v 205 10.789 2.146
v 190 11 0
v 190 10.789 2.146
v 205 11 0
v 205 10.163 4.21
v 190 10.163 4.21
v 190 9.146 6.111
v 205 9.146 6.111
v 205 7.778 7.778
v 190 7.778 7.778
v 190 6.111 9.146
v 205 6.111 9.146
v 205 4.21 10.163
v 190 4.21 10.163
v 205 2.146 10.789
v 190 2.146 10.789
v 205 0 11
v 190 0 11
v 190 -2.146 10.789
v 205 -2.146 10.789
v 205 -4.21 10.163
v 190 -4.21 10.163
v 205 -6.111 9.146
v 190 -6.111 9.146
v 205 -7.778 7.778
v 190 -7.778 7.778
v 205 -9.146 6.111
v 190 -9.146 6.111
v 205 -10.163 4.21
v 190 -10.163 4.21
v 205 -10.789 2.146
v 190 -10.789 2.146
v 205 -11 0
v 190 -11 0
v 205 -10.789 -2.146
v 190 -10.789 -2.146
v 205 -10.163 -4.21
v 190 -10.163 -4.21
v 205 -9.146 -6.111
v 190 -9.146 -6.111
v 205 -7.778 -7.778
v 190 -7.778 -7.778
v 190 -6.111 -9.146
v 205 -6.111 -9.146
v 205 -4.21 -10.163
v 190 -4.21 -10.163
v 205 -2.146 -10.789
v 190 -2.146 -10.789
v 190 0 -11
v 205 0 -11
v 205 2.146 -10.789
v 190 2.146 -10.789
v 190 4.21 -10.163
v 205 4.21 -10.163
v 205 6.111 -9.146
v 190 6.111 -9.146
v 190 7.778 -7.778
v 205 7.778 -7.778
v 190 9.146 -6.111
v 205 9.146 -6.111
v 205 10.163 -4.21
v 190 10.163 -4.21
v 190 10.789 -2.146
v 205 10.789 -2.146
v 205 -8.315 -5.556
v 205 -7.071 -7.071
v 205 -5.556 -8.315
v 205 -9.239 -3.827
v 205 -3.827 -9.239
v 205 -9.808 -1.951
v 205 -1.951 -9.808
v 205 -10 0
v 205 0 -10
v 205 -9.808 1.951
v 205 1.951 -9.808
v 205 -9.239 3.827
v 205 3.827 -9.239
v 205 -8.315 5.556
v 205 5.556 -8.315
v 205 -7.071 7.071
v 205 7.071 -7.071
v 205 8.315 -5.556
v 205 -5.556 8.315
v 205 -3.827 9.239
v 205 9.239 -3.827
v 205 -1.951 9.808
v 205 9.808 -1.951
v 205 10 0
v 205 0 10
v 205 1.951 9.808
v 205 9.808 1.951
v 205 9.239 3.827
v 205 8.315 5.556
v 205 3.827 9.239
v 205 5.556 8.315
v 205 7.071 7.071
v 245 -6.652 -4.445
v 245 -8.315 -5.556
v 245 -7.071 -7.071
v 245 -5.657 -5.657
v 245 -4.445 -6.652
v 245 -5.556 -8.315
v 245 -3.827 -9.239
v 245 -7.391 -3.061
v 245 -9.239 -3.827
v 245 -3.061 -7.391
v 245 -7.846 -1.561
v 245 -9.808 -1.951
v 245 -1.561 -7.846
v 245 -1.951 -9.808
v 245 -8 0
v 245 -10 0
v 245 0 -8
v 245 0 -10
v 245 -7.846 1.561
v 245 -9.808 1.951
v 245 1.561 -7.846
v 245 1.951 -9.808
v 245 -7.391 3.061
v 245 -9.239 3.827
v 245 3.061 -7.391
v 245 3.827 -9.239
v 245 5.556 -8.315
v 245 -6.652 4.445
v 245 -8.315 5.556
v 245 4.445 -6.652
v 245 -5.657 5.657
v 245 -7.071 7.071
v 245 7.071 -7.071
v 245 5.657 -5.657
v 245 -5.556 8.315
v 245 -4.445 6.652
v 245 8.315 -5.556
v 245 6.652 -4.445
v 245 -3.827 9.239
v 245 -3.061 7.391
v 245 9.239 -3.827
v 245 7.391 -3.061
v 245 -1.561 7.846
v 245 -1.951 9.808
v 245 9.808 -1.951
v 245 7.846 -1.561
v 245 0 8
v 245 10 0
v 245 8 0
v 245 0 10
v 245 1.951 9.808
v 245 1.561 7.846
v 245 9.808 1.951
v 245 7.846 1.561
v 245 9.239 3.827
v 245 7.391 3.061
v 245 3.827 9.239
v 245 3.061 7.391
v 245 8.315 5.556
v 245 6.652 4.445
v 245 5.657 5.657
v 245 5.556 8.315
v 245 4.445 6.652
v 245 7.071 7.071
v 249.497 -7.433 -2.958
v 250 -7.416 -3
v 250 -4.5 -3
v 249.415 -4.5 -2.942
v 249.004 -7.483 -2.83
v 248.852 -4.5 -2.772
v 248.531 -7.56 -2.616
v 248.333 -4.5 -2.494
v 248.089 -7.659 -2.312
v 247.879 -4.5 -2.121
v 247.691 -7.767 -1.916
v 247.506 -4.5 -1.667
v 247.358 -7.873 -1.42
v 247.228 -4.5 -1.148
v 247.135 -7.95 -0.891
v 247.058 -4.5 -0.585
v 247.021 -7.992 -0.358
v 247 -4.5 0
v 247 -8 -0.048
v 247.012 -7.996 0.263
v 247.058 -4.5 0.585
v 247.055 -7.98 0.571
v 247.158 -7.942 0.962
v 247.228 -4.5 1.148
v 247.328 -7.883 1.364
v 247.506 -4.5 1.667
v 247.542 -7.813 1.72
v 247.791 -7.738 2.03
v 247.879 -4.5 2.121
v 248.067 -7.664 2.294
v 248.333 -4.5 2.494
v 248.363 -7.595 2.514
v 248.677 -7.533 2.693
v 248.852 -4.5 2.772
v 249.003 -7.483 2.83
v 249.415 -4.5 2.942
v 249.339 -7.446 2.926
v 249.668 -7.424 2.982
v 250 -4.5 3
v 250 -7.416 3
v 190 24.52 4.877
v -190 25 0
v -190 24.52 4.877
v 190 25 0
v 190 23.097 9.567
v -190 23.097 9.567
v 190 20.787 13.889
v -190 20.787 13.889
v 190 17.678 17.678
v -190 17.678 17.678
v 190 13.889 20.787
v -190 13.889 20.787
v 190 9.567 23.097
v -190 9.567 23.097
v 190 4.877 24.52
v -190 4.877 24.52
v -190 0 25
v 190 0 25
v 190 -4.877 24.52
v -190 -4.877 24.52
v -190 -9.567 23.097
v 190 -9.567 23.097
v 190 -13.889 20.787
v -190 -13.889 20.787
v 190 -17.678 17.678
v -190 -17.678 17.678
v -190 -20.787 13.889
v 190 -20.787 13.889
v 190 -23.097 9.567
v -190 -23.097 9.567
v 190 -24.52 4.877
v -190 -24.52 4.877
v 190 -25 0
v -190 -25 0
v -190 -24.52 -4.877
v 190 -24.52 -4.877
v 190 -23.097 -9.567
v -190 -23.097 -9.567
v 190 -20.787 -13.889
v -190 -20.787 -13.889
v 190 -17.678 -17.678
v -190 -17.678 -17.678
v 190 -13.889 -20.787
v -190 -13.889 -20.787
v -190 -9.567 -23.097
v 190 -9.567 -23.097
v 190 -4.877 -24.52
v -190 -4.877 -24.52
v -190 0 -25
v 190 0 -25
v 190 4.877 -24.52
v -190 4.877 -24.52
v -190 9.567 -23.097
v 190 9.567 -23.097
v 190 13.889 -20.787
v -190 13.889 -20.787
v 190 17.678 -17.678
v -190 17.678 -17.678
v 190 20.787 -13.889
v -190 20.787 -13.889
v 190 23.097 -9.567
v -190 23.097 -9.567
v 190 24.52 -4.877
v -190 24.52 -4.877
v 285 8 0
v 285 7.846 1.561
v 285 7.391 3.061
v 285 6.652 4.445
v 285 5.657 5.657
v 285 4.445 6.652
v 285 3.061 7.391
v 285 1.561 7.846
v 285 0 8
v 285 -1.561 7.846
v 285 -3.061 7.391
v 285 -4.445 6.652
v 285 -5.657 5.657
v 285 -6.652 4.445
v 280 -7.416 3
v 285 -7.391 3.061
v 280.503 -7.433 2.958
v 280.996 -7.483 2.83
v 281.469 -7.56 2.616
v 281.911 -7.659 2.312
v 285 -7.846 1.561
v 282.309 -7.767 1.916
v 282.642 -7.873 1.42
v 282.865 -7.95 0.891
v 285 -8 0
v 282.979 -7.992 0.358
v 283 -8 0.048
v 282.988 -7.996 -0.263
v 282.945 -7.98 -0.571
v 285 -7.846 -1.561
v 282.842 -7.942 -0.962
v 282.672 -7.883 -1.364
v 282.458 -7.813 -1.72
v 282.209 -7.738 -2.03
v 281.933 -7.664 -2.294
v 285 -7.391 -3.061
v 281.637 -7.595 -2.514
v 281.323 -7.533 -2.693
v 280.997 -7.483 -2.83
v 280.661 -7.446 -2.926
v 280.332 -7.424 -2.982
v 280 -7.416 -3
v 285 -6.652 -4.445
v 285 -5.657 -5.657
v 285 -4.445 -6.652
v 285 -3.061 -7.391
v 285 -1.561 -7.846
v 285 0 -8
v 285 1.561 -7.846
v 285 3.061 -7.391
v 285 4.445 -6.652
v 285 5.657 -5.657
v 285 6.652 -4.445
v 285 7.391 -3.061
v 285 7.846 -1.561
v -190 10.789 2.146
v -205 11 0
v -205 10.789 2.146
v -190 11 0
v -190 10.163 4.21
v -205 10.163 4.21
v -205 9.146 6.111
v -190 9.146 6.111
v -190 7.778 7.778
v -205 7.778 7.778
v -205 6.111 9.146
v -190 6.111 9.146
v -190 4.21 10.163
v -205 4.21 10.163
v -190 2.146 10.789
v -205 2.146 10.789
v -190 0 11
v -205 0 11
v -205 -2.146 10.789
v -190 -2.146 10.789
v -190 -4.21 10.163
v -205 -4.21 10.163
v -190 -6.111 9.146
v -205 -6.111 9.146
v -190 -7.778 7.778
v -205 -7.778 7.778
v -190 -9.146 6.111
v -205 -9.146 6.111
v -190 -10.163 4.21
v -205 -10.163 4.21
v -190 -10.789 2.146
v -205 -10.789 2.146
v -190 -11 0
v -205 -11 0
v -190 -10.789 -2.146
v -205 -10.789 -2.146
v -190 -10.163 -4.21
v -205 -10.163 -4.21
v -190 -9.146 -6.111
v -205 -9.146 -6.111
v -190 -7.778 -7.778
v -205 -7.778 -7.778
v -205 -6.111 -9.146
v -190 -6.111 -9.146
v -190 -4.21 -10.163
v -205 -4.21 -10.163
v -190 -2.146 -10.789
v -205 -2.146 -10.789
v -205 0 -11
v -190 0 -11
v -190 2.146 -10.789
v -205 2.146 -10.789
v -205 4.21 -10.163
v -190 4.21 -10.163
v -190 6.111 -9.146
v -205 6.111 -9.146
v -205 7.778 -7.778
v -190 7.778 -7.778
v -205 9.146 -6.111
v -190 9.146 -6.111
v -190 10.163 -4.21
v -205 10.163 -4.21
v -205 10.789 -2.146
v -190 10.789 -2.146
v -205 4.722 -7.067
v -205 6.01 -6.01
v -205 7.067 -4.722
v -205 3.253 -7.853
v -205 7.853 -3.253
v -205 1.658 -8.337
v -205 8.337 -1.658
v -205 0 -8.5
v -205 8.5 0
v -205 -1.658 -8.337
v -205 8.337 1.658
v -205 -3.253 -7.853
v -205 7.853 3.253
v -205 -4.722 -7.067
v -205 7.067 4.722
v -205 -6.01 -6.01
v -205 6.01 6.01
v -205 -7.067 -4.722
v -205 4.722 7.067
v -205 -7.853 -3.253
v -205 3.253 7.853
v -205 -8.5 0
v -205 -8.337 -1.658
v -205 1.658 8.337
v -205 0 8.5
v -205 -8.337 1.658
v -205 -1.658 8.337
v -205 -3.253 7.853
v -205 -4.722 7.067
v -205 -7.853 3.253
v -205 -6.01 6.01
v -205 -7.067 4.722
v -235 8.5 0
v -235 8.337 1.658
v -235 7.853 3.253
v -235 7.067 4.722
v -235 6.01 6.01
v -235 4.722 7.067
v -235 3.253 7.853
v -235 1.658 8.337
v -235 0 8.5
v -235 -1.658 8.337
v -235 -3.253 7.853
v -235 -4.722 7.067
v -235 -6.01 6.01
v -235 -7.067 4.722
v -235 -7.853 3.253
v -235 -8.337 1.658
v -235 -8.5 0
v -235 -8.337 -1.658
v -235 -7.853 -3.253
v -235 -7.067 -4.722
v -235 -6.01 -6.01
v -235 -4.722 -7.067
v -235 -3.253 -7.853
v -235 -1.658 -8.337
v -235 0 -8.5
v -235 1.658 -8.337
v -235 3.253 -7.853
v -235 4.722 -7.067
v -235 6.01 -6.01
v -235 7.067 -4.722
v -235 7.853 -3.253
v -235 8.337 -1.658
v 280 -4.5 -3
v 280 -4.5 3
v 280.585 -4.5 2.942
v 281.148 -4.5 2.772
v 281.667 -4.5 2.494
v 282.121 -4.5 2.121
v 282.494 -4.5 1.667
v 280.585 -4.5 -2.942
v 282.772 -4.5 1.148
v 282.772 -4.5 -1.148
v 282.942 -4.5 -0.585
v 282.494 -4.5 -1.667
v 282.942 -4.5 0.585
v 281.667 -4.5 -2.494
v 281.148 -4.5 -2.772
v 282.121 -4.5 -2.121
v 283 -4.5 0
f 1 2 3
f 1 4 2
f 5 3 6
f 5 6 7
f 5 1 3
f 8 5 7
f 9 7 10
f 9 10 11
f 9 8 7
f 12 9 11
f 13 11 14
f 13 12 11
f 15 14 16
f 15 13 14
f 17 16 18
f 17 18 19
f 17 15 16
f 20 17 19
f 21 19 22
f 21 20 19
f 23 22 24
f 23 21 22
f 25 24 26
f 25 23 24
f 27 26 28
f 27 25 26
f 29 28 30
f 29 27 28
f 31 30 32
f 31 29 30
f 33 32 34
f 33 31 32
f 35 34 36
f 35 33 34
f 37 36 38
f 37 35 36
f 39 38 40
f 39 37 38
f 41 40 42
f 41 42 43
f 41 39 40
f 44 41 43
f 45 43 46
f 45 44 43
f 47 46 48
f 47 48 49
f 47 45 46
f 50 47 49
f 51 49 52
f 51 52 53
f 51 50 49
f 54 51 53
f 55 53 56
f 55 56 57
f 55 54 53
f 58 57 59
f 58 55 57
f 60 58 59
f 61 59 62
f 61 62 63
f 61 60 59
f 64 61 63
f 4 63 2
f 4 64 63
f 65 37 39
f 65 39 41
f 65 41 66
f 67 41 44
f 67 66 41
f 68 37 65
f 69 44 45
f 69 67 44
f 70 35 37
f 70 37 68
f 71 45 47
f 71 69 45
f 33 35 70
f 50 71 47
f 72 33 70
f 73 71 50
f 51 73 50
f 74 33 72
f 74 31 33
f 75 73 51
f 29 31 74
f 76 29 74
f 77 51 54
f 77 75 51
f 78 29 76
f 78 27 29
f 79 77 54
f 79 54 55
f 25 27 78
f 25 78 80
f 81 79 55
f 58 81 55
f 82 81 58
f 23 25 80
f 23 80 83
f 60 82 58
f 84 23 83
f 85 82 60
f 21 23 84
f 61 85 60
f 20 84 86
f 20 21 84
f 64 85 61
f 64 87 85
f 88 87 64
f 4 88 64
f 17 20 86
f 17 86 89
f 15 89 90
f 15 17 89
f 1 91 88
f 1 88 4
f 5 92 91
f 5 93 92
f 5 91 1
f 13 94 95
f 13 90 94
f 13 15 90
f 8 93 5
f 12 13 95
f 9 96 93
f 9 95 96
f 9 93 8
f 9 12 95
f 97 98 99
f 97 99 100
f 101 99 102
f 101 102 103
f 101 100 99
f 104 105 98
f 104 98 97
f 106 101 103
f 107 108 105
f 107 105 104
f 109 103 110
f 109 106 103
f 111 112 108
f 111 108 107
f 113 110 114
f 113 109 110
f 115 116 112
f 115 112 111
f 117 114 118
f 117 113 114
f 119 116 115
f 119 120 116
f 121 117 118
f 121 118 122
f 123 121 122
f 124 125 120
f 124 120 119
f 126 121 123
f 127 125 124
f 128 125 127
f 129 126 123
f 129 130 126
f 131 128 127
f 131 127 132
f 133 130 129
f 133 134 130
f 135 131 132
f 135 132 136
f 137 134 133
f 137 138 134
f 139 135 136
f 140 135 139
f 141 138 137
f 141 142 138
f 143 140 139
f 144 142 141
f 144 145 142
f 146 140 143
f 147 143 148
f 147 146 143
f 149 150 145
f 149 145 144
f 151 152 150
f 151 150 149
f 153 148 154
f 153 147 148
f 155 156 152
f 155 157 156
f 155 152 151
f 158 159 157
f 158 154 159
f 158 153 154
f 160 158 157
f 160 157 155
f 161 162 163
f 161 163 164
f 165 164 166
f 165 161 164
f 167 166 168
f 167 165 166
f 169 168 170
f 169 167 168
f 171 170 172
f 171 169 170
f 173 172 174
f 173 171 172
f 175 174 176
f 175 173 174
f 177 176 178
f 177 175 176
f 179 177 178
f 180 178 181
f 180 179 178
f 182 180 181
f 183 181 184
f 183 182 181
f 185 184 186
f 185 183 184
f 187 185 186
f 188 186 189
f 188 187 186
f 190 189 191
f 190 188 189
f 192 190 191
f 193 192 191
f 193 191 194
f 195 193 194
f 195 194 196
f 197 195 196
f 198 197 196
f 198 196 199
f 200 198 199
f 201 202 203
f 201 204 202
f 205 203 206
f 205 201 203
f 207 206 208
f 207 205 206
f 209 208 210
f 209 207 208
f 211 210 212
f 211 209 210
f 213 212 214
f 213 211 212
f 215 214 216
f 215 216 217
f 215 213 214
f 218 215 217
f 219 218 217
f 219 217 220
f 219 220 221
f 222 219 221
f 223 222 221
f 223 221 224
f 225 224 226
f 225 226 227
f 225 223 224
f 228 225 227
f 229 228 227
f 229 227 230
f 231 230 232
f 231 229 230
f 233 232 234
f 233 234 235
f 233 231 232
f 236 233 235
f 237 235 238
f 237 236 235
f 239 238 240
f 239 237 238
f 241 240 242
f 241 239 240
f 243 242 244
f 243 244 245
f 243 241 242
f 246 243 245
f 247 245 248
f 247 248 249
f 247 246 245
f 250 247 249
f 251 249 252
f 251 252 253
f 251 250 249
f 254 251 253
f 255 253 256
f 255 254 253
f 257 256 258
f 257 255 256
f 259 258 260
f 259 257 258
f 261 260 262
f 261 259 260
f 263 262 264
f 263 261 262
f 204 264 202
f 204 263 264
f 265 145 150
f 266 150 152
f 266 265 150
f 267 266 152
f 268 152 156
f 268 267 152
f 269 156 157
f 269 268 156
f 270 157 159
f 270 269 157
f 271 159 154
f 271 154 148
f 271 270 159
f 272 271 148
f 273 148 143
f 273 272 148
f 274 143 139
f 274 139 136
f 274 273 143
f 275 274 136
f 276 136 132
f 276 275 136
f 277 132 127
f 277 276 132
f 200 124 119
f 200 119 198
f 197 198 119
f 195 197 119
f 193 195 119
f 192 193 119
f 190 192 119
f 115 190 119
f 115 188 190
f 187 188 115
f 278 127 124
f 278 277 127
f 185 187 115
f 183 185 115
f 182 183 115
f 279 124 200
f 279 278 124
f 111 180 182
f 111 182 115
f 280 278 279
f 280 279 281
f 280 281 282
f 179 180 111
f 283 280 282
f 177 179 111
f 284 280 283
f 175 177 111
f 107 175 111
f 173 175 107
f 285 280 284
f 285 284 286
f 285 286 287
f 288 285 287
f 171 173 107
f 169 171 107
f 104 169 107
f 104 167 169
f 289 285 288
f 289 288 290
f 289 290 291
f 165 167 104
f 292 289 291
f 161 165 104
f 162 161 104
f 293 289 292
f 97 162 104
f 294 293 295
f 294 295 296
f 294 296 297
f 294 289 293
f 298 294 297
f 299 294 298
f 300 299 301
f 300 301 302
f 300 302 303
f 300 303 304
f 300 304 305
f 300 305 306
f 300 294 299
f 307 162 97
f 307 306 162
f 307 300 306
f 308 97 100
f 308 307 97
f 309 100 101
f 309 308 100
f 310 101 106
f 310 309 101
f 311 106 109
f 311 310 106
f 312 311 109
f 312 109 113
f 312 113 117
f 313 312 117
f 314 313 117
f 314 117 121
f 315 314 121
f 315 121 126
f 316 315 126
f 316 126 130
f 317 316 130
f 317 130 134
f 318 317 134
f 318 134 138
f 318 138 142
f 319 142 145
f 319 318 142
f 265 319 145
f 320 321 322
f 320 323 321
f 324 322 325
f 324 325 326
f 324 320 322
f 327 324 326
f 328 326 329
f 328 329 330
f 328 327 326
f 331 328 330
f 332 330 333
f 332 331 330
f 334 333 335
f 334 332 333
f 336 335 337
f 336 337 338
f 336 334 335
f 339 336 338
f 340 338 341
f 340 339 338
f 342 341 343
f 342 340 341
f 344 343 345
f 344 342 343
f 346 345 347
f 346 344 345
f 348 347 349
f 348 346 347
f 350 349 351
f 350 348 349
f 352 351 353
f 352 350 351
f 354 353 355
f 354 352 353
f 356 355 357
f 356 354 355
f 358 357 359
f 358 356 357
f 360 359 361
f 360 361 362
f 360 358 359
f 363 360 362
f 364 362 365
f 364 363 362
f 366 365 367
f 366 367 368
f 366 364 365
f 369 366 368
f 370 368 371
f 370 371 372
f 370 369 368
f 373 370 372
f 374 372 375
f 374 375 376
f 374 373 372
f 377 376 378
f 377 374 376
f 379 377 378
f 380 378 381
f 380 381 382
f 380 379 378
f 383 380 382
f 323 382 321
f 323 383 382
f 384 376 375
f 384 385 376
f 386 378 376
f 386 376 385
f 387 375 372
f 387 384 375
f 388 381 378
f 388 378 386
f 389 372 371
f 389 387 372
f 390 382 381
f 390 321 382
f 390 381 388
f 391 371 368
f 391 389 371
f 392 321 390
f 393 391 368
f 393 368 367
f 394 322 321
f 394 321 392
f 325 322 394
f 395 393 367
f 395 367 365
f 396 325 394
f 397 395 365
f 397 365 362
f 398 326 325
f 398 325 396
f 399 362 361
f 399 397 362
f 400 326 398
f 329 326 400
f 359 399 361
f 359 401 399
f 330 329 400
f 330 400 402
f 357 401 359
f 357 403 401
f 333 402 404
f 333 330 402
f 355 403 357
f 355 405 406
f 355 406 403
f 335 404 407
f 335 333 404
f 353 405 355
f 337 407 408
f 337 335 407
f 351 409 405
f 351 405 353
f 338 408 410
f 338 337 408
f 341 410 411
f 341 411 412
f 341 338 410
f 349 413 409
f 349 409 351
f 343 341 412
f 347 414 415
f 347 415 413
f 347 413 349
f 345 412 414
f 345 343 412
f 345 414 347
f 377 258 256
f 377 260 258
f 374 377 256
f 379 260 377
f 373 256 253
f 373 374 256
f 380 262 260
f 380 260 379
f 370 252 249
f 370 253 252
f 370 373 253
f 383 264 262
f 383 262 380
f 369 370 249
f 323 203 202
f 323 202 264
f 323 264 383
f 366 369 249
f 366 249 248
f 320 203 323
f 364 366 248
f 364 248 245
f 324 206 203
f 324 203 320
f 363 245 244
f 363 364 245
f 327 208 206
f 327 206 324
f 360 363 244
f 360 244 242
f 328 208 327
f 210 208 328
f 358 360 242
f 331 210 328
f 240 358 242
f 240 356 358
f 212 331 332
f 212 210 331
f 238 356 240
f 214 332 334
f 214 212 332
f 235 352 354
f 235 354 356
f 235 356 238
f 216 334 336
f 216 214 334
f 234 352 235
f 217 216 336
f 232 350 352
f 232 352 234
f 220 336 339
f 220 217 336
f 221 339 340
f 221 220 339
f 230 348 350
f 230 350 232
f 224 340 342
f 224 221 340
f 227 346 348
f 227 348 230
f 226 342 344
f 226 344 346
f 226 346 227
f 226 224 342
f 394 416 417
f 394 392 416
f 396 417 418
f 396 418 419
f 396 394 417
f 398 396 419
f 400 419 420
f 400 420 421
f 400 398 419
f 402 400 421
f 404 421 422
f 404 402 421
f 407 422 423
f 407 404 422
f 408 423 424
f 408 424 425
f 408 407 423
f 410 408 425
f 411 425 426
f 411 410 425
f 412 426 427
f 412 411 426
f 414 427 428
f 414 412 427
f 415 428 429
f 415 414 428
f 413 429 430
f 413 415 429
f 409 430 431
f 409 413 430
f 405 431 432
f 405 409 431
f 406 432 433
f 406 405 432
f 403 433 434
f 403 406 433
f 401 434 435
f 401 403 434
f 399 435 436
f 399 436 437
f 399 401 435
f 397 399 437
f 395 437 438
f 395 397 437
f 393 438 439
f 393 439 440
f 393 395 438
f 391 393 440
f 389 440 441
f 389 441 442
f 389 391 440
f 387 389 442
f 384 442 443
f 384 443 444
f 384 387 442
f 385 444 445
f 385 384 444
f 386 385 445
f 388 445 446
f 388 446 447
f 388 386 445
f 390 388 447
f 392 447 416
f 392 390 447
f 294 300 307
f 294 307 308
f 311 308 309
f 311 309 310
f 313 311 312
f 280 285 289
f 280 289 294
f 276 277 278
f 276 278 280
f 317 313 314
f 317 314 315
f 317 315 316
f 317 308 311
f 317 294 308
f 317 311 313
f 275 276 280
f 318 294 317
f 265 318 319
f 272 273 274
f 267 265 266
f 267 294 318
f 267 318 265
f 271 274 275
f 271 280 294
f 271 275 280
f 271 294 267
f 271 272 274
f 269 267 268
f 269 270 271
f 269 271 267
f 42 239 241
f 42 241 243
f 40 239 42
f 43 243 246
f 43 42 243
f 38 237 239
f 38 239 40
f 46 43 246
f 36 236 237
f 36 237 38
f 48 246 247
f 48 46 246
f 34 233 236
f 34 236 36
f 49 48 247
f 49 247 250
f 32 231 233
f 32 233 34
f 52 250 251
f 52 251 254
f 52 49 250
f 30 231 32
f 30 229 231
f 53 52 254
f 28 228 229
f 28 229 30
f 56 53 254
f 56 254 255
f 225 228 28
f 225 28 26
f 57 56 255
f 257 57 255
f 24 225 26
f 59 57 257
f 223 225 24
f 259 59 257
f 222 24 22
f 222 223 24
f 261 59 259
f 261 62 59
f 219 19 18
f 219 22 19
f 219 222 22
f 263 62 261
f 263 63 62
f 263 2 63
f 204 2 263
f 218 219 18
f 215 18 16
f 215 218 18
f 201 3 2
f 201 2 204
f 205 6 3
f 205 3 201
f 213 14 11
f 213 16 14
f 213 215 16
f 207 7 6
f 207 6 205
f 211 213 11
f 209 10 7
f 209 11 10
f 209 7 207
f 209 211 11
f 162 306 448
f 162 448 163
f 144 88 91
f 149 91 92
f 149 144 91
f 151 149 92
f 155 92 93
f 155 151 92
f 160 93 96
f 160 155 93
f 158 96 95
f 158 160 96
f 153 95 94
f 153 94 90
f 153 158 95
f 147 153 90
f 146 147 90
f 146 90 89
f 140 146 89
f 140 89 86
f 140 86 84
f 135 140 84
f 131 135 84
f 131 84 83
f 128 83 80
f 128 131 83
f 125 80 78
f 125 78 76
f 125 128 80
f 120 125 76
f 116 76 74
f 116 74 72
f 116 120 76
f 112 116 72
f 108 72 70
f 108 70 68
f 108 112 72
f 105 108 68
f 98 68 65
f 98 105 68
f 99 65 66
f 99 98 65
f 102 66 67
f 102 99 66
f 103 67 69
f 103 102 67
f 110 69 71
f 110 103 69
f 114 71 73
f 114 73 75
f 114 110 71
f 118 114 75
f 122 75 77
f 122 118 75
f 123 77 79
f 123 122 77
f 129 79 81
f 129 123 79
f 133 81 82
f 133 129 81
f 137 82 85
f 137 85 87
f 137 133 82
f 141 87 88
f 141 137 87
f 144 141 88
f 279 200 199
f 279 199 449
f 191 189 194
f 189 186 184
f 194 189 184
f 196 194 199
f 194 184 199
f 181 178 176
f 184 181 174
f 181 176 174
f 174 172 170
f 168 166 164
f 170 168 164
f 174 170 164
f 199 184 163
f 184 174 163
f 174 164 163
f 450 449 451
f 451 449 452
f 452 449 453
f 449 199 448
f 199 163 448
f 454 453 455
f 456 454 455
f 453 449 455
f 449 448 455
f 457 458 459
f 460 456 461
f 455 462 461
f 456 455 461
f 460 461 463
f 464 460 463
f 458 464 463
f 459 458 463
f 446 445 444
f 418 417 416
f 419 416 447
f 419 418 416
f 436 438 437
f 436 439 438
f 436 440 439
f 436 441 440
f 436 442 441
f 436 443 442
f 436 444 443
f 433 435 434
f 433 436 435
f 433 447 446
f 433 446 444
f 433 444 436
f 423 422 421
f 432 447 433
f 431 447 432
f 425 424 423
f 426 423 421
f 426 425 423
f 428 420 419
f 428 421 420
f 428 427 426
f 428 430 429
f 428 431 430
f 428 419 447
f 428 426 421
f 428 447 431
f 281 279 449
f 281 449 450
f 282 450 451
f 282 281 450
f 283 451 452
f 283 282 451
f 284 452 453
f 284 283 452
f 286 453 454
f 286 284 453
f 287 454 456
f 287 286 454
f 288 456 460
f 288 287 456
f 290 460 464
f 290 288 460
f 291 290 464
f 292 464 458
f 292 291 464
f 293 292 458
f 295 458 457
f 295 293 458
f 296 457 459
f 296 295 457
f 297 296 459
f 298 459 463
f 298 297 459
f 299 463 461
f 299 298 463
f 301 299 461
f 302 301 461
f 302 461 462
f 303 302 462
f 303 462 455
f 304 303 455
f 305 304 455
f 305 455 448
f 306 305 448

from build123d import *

# Parameters (mm, degrees)
CUT_EXTRUDE_1_DEPTH = 3.5


with BuildPart() as part:
    # 草图1 → 旋转1 (revolve)
    with BuildSketch(Plane.XY):
        Polygon((-190, 25), (190, 25), (190, 11), (205, 11), (205, 10), (245, 10), (245, 8), (285, 8), (285, 0), (-235, 0), (-235, 8.5), (-205, 8.5), (-205, 11), (-190, 11), align=None)
    revolve(axis=Axis((-235, 0, 0), (1, 0, 0)))

    # 草图3 → 切除-拉伸1 (cut)
    with BuildSketch(Plane(origin=(0, -8, 0), x_dir=(-1, 0, 0), z_dir=(0, -1, 0))):
        with BuildLine():
            Line((-280, 3), (-250, 3))
            ThreePointArc((-250, 3), (-247, 0), (-250, -3))
            Line((-250, -3), (-280, -3))
            ThreePointArc((-280, -3), (-283, 0), (-280, 3))
        make_face()
    extrude(amount=-CUT_EXTRUDE_1_DEPTH, mode=Mode.SUBTRACT)


solid = part.part
